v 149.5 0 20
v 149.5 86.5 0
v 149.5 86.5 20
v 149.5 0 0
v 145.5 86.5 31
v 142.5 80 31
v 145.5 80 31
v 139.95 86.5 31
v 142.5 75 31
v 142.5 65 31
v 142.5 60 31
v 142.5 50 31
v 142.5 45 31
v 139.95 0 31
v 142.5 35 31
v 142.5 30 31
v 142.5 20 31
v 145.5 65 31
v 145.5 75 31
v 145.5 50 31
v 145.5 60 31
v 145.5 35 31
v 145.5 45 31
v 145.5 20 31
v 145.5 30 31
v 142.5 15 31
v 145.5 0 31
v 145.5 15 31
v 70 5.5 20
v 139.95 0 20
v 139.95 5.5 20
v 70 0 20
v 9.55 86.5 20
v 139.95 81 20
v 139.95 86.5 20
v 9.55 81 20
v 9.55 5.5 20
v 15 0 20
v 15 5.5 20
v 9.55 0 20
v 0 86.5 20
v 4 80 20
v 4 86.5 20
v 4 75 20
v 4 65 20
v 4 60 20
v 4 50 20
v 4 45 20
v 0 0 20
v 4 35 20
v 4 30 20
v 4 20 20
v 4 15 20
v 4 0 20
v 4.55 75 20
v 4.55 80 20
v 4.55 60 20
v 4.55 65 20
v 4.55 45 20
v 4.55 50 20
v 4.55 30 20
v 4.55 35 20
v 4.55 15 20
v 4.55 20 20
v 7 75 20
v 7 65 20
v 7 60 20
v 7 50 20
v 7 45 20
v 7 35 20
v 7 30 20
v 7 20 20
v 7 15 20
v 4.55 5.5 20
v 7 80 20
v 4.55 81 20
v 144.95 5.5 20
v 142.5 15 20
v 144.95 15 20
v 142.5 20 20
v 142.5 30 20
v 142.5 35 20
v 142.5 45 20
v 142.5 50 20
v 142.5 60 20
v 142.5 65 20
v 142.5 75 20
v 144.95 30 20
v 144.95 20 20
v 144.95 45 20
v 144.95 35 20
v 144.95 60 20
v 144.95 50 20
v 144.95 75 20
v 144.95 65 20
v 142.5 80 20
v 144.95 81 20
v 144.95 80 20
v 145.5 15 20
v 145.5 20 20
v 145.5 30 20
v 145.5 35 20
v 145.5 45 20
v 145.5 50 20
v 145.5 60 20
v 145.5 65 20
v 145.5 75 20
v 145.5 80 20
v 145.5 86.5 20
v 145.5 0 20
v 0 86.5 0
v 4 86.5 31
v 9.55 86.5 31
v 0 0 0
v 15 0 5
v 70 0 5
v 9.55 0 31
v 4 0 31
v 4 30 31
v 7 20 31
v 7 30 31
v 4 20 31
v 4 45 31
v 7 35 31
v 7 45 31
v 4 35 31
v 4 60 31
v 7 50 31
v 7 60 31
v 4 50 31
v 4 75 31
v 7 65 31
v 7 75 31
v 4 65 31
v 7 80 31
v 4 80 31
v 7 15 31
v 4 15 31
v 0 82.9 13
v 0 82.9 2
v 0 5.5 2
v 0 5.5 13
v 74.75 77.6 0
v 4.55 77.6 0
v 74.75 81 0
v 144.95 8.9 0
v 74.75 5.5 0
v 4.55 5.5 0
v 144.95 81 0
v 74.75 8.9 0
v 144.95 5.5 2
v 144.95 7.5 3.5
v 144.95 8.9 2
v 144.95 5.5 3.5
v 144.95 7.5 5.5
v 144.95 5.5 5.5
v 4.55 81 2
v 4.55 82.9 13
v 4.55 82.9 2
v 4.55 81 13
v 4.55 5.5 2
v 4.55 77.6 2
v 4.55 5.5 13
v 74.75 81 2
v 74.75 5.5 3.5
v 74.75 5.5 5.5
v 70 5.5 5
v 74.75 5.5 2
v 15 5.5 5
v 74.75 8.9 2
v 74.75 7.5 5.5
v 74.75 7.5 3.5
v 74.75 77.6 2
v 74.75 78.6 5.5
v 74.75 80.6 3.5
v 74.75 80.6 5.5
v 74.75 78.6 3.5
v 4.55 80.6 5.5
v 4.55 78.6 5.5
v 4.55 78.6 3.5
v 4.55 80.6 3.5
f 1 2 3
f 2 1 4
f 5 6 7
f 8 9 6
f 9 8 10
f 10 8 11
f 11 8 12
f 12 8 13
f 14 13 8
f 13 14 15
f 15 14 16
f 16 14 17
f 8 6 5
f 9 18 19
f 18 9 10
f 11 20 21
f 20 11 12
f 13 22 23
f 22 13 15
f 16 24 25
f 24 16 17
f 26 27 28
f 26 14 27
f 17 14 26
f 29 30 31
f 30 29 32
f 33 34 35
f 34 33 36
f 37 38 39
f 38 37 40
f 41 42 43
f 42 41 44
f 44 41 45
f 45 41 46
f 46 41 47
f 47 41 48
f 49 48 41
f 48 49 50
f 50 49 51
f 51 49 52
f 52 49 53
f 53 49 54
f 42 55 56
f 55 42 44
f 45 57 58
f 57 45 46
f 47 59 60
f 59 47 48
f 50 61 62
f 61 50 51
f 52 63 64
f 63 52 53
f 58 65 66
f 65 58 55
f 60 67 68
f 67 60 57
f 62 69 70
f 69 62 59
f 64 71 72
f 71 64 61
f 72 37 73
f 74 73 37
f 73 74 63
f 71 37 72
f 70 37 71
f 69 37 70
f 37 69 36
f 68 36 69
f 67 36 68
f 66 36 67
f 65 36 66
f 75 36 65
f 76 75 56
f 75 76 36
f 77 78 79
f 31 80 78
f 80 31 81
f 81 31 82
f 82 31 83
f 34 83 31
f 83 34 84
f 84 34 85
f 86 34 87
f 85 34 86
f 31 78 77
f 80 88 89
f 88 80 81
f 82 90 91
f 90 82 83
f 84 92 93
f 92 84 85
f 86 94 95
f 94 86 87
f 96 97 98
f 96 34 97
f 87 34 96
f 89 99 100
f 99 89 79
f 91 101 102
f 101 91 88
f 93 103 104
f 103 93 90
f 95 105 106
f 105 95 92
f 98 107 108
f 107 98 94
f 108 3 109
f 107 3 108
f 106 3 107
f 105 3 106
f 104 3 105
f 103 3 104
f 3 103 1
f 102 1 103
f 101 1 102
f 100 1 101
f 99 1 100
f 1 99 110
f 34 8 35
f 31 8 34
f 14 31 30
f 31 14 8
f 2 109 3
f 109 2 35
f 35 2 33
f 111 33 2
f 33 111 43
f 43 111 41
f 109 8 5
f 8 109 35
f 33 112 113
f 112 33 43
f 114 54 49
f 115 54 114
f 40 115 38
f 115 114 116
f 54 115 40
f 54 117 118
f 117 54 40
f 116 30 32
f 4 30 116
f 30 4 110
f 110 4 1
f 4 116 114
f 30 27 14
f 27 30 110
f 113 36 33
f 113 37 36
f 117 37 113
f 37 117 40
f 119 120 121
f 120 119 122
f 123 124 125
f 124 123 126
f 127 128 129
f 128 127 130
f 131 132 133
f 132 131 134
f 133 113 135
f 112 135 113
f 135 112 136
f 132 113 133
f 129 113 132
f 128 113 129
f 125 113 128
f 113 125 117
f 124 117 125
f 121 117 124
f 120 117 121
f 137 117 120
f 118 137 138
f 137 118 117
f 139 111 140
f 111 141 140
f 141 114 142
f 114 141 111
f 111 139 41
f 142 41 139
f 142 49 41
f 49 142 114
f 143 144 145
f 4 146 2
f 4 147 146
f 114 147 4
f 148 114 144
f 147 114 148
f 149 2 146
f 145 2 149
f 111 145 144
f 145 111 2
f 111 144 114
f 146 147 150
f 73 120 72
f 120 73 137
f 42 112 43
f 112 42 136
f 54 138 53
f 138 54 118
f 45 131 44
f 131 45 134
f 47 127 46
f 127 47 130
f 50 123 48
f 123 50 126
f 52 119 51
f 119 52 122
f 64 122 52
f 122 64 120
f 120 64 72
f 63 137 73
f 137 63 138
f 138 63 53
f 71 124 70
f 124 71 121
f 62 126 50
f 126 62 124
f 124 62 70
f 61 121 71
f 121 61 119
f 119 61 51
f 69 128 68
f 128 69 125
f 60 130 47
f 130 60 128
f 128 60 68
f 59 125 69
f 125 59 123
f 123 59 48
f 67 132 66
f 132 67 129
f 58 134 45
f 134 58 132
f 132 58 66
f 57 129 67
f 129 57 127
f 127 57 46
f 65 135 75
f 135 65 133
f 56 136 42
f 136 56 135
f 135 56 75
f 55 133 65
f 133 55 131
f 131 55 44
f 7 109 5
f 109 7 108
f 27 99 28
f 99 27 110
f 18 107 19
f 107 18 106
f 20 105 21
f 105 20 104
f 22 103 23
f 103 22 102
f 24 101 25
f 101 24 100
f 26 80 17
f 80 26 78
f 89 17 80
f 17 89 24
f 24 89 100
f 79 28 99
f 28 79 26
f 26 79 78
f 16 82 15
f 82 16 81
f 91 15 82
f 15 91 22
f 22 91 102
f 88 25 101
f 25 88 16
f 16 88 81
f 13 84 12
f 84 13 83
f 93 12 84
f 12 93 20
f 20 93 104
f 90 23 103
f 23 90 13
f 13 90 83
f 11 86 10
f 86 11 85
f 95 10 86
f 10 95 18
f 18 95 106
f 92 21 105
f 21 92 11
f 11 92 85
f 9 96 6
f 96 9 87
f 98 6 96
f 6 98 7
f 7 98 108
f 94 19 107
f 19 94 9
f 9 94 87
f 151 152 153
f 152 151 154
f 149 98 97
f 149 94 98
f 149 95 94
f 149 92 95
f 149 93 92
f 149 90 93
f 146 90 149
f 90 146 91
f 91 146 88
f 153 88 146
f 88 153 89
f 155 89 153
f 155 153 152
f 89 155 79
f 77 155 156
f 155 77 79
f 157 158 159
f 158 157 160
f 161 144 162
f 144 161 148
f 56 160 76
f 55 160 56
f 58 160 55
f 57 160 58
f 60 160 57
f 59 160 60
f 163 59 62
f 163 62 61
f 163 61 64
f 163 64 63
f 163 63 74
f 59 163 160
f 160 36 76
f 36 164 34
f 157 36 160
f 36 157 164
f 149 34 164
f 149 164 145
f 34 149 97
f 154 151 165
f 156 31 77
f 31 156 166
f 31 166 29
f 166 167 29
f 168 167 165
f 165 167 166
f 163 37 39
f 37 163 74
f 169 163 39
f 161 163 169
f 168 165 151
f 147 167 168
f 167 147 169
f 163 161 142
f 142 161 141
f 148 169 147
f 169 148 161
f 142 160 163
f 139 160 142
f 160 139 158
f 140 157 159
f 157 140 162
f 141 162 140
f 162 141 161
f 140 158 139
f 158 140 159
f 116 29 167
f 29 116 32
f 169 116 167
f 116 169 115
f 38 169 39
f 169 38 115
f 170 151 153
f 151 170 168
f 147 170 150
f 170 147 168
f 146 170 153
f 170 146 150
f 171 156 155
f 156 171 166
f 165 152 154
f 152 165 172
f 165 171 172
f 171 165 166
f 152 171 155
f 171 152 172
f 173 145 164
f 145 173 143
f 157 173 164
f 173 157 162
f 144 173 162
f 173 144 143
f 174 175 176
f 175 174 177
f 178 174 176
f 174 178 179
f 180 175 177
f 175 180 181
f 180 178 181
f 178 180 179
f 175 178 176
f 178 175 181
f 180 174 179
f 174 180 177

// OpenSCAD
// this brace holds a 5" Waveshare AMOLED capacitance screen in two 5.25"
// FlexBays in my CaseLabs Magnum T10. the brace itself will fit in any two
// colocated 5.25" bays; the mounts (amoled_flare.scad) are specific to
// the CaseLabs FlexBays. two mounts ought be printed along with this brace.
// they can then be glued together using e.g. Loctite along the lap joints.
//
// TODO: ought use a dovetail joint.
//
// if your printer can do more than 150mm, you can print the whole thing as
// a single piece, which is obviously desirable.

// dimensions of two FlexBays (what we're filling)
ew=149.5;
eh=86.5;

// amoled device dimensions (what we're holding)
ah=75.5;
aw=140.4;
at=1.5;
avm = (eh - ah) / 2; // device vertical margin
ahm = (ew - aw) / 2; // device horizontal margin

// screen dimensions (what we're viewing)
sh=68.7;
sw=121.76;
svm = (ah - sh) / 2; // screen vertical margin
shm = (aw - sw) / 2; // screen horizontal margin

fst = 2; // front slider thickness

depth=20; // unflared depth
backdepth=11; // flare-out depth
// unfortunately, my 150mm printer can't handle the flare, so
// we need print them as distinct pieces.
flare=0; // flare width
flarei = 5; // flare inset

// border around device, filling flexbay
difference(){
    union(){
        translate([aw + ahm - flarei, 0, depth]){
            cube([ahm + flare + flarei, eh, backdepth]);
        }
        translate([-flare, 0, depth]){
            cube([ahm + flare + flarei, eh, backdepth]);
        }
        cube([ew, eh, depth]);
    }
    union(){
        // leave out center for actual display
        translate([ahm, avm, 0]){
            cube([aw, ah, depth]);
        }
        // cut out on the side to slide through
        translate([0, avm, fst]){
            cube([ahm, eh - 2 * ahm, depth - fst - 7]);
        }
        // hole in the top for power hookup
        translate([15, -10, 5]){
            cube([55, 30, 15]);
        }
        // lap joints on back to paste flare
        // left
        translate([0, 0, depth]){
            cube([flarei - 1, eh, backdepth]);
            for(i = [1:5]){
                translate([flarei - 1, i * 15, 0]){
                    cube([3, 5, backdepth]);
                }
            }
        }
        // right
        translate([ew - flarei + 1, 0, depth]){
            cube([flarei - 1, eh, backdepth]);
            for(i = [1:5]){
                translate([-3, i * 15, 0]){
                    cube([3, 5, backdepth]);
                }
            }
        }
    }
}

// sliders to insert + hold device (front bottom)
translate([ahm + aw / 2, avm, 0]){
    cube([aw / 2, svm, fst]);
}
// back bottom
translate([ahm + aw / 2, avm, fst + at]){
    cube([aw / 2, 2, fst]);
}
// front top
translate([ahm, avm + sh + svm, 0]){
    cube([aw / 2, svm, fst]);
}
// back top
translate([ahm, sh + avm + svm + 1, fst + at]){
    cube([aw / 2, 2, fst]);
}
